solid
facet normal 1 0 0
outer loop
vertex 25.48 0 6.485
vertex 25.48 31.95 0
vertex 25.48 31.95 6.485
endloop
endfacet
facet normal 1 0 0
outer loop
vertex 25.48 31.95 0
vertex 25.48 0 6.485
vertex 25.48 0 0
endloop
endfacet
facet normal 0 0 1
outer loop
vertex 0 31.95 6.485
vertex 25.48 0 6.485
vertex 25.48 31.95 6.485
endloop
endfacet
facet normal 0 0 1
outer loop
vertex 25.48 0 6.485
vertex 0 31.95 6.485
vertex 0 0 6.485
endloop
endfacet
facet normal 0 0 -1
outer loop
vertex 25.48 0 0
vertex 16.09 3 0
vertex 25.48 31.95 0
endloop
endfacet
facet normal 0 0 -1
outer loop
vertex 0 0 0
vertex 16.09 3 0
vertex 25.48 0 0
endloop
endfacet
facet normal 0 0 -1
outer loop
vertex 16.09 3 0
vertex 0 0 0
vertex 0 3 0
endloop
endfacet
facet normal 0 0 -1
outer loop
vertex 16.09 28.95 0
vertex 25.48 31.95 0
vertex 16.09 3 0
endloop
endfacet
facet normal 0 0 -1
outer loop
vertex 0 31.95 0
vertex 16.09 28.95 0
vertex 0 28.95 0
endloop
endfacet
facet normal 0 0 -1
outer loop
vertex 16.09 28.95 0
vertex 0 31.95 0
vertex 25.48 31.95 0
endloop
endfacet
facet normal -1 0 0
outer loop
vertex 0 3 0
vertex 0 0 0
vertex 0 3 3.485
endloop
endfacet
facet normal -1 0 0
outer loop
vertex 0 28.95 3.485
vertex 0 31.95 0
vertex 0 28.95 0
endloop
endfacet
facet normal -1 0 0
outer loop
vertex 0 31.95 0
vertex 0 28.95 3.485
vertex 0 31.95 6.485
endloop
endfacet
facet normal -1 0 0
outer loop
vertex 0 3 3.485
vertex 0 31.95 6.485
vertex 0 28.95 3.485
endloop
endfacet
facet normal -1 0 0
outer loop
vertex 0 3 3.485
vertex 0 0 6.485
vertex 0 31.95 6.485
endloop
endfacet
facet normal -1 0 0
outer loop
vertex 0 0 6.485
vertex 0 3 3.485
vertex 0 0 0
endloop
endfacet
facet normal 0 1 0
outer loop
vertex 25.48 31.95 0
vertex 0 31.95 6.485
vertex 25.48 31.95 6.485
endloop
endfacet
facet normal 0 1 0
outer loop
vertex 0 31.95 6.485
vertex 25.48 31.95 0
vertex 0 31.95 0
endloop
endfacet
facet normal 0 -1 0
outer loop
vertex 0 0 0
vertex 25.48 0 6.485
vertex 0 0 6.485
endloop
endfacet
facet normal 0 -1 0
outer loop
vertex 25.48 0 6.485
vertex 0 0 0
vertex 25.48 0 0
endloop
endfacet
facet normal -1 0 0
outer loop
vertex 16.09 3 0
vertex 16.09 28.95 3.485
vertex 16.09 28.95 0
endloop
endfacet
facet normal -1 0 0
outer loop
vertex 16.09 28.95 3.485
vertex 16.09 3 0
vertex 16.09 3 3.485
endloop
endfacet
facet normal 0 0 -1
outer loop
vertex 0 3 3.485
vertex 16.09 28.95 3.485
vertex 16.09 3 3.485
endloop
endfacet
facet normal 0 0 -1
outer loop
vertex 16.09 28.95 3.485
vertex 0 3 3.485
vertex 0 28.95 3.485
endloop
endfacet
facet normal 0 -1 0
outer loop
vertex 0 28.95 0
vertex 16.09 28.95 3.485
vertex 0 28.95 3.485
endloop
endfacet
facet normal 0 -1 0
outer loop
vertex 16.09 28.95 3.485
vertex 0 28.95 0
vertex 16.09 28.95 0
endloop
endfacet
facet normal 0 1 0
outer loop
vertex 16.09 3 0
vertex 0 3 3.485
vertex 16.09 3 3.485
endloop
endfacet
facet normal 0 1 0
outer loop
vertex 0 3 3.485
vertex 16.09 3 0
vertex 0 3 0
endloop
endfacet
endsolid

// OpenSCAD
width = 6.97;
breadth = 25.95;
depth = 16.09;

join = 5.09;
join_len = 3.39;

button = 3.79;
wall = 3;

difference() {
    cube([depth+join_len+wall*2,breadth+wall*2,width/2+wall]);
    translate([0,wall,0]) cube([depth,breadth,width/2]);
}
